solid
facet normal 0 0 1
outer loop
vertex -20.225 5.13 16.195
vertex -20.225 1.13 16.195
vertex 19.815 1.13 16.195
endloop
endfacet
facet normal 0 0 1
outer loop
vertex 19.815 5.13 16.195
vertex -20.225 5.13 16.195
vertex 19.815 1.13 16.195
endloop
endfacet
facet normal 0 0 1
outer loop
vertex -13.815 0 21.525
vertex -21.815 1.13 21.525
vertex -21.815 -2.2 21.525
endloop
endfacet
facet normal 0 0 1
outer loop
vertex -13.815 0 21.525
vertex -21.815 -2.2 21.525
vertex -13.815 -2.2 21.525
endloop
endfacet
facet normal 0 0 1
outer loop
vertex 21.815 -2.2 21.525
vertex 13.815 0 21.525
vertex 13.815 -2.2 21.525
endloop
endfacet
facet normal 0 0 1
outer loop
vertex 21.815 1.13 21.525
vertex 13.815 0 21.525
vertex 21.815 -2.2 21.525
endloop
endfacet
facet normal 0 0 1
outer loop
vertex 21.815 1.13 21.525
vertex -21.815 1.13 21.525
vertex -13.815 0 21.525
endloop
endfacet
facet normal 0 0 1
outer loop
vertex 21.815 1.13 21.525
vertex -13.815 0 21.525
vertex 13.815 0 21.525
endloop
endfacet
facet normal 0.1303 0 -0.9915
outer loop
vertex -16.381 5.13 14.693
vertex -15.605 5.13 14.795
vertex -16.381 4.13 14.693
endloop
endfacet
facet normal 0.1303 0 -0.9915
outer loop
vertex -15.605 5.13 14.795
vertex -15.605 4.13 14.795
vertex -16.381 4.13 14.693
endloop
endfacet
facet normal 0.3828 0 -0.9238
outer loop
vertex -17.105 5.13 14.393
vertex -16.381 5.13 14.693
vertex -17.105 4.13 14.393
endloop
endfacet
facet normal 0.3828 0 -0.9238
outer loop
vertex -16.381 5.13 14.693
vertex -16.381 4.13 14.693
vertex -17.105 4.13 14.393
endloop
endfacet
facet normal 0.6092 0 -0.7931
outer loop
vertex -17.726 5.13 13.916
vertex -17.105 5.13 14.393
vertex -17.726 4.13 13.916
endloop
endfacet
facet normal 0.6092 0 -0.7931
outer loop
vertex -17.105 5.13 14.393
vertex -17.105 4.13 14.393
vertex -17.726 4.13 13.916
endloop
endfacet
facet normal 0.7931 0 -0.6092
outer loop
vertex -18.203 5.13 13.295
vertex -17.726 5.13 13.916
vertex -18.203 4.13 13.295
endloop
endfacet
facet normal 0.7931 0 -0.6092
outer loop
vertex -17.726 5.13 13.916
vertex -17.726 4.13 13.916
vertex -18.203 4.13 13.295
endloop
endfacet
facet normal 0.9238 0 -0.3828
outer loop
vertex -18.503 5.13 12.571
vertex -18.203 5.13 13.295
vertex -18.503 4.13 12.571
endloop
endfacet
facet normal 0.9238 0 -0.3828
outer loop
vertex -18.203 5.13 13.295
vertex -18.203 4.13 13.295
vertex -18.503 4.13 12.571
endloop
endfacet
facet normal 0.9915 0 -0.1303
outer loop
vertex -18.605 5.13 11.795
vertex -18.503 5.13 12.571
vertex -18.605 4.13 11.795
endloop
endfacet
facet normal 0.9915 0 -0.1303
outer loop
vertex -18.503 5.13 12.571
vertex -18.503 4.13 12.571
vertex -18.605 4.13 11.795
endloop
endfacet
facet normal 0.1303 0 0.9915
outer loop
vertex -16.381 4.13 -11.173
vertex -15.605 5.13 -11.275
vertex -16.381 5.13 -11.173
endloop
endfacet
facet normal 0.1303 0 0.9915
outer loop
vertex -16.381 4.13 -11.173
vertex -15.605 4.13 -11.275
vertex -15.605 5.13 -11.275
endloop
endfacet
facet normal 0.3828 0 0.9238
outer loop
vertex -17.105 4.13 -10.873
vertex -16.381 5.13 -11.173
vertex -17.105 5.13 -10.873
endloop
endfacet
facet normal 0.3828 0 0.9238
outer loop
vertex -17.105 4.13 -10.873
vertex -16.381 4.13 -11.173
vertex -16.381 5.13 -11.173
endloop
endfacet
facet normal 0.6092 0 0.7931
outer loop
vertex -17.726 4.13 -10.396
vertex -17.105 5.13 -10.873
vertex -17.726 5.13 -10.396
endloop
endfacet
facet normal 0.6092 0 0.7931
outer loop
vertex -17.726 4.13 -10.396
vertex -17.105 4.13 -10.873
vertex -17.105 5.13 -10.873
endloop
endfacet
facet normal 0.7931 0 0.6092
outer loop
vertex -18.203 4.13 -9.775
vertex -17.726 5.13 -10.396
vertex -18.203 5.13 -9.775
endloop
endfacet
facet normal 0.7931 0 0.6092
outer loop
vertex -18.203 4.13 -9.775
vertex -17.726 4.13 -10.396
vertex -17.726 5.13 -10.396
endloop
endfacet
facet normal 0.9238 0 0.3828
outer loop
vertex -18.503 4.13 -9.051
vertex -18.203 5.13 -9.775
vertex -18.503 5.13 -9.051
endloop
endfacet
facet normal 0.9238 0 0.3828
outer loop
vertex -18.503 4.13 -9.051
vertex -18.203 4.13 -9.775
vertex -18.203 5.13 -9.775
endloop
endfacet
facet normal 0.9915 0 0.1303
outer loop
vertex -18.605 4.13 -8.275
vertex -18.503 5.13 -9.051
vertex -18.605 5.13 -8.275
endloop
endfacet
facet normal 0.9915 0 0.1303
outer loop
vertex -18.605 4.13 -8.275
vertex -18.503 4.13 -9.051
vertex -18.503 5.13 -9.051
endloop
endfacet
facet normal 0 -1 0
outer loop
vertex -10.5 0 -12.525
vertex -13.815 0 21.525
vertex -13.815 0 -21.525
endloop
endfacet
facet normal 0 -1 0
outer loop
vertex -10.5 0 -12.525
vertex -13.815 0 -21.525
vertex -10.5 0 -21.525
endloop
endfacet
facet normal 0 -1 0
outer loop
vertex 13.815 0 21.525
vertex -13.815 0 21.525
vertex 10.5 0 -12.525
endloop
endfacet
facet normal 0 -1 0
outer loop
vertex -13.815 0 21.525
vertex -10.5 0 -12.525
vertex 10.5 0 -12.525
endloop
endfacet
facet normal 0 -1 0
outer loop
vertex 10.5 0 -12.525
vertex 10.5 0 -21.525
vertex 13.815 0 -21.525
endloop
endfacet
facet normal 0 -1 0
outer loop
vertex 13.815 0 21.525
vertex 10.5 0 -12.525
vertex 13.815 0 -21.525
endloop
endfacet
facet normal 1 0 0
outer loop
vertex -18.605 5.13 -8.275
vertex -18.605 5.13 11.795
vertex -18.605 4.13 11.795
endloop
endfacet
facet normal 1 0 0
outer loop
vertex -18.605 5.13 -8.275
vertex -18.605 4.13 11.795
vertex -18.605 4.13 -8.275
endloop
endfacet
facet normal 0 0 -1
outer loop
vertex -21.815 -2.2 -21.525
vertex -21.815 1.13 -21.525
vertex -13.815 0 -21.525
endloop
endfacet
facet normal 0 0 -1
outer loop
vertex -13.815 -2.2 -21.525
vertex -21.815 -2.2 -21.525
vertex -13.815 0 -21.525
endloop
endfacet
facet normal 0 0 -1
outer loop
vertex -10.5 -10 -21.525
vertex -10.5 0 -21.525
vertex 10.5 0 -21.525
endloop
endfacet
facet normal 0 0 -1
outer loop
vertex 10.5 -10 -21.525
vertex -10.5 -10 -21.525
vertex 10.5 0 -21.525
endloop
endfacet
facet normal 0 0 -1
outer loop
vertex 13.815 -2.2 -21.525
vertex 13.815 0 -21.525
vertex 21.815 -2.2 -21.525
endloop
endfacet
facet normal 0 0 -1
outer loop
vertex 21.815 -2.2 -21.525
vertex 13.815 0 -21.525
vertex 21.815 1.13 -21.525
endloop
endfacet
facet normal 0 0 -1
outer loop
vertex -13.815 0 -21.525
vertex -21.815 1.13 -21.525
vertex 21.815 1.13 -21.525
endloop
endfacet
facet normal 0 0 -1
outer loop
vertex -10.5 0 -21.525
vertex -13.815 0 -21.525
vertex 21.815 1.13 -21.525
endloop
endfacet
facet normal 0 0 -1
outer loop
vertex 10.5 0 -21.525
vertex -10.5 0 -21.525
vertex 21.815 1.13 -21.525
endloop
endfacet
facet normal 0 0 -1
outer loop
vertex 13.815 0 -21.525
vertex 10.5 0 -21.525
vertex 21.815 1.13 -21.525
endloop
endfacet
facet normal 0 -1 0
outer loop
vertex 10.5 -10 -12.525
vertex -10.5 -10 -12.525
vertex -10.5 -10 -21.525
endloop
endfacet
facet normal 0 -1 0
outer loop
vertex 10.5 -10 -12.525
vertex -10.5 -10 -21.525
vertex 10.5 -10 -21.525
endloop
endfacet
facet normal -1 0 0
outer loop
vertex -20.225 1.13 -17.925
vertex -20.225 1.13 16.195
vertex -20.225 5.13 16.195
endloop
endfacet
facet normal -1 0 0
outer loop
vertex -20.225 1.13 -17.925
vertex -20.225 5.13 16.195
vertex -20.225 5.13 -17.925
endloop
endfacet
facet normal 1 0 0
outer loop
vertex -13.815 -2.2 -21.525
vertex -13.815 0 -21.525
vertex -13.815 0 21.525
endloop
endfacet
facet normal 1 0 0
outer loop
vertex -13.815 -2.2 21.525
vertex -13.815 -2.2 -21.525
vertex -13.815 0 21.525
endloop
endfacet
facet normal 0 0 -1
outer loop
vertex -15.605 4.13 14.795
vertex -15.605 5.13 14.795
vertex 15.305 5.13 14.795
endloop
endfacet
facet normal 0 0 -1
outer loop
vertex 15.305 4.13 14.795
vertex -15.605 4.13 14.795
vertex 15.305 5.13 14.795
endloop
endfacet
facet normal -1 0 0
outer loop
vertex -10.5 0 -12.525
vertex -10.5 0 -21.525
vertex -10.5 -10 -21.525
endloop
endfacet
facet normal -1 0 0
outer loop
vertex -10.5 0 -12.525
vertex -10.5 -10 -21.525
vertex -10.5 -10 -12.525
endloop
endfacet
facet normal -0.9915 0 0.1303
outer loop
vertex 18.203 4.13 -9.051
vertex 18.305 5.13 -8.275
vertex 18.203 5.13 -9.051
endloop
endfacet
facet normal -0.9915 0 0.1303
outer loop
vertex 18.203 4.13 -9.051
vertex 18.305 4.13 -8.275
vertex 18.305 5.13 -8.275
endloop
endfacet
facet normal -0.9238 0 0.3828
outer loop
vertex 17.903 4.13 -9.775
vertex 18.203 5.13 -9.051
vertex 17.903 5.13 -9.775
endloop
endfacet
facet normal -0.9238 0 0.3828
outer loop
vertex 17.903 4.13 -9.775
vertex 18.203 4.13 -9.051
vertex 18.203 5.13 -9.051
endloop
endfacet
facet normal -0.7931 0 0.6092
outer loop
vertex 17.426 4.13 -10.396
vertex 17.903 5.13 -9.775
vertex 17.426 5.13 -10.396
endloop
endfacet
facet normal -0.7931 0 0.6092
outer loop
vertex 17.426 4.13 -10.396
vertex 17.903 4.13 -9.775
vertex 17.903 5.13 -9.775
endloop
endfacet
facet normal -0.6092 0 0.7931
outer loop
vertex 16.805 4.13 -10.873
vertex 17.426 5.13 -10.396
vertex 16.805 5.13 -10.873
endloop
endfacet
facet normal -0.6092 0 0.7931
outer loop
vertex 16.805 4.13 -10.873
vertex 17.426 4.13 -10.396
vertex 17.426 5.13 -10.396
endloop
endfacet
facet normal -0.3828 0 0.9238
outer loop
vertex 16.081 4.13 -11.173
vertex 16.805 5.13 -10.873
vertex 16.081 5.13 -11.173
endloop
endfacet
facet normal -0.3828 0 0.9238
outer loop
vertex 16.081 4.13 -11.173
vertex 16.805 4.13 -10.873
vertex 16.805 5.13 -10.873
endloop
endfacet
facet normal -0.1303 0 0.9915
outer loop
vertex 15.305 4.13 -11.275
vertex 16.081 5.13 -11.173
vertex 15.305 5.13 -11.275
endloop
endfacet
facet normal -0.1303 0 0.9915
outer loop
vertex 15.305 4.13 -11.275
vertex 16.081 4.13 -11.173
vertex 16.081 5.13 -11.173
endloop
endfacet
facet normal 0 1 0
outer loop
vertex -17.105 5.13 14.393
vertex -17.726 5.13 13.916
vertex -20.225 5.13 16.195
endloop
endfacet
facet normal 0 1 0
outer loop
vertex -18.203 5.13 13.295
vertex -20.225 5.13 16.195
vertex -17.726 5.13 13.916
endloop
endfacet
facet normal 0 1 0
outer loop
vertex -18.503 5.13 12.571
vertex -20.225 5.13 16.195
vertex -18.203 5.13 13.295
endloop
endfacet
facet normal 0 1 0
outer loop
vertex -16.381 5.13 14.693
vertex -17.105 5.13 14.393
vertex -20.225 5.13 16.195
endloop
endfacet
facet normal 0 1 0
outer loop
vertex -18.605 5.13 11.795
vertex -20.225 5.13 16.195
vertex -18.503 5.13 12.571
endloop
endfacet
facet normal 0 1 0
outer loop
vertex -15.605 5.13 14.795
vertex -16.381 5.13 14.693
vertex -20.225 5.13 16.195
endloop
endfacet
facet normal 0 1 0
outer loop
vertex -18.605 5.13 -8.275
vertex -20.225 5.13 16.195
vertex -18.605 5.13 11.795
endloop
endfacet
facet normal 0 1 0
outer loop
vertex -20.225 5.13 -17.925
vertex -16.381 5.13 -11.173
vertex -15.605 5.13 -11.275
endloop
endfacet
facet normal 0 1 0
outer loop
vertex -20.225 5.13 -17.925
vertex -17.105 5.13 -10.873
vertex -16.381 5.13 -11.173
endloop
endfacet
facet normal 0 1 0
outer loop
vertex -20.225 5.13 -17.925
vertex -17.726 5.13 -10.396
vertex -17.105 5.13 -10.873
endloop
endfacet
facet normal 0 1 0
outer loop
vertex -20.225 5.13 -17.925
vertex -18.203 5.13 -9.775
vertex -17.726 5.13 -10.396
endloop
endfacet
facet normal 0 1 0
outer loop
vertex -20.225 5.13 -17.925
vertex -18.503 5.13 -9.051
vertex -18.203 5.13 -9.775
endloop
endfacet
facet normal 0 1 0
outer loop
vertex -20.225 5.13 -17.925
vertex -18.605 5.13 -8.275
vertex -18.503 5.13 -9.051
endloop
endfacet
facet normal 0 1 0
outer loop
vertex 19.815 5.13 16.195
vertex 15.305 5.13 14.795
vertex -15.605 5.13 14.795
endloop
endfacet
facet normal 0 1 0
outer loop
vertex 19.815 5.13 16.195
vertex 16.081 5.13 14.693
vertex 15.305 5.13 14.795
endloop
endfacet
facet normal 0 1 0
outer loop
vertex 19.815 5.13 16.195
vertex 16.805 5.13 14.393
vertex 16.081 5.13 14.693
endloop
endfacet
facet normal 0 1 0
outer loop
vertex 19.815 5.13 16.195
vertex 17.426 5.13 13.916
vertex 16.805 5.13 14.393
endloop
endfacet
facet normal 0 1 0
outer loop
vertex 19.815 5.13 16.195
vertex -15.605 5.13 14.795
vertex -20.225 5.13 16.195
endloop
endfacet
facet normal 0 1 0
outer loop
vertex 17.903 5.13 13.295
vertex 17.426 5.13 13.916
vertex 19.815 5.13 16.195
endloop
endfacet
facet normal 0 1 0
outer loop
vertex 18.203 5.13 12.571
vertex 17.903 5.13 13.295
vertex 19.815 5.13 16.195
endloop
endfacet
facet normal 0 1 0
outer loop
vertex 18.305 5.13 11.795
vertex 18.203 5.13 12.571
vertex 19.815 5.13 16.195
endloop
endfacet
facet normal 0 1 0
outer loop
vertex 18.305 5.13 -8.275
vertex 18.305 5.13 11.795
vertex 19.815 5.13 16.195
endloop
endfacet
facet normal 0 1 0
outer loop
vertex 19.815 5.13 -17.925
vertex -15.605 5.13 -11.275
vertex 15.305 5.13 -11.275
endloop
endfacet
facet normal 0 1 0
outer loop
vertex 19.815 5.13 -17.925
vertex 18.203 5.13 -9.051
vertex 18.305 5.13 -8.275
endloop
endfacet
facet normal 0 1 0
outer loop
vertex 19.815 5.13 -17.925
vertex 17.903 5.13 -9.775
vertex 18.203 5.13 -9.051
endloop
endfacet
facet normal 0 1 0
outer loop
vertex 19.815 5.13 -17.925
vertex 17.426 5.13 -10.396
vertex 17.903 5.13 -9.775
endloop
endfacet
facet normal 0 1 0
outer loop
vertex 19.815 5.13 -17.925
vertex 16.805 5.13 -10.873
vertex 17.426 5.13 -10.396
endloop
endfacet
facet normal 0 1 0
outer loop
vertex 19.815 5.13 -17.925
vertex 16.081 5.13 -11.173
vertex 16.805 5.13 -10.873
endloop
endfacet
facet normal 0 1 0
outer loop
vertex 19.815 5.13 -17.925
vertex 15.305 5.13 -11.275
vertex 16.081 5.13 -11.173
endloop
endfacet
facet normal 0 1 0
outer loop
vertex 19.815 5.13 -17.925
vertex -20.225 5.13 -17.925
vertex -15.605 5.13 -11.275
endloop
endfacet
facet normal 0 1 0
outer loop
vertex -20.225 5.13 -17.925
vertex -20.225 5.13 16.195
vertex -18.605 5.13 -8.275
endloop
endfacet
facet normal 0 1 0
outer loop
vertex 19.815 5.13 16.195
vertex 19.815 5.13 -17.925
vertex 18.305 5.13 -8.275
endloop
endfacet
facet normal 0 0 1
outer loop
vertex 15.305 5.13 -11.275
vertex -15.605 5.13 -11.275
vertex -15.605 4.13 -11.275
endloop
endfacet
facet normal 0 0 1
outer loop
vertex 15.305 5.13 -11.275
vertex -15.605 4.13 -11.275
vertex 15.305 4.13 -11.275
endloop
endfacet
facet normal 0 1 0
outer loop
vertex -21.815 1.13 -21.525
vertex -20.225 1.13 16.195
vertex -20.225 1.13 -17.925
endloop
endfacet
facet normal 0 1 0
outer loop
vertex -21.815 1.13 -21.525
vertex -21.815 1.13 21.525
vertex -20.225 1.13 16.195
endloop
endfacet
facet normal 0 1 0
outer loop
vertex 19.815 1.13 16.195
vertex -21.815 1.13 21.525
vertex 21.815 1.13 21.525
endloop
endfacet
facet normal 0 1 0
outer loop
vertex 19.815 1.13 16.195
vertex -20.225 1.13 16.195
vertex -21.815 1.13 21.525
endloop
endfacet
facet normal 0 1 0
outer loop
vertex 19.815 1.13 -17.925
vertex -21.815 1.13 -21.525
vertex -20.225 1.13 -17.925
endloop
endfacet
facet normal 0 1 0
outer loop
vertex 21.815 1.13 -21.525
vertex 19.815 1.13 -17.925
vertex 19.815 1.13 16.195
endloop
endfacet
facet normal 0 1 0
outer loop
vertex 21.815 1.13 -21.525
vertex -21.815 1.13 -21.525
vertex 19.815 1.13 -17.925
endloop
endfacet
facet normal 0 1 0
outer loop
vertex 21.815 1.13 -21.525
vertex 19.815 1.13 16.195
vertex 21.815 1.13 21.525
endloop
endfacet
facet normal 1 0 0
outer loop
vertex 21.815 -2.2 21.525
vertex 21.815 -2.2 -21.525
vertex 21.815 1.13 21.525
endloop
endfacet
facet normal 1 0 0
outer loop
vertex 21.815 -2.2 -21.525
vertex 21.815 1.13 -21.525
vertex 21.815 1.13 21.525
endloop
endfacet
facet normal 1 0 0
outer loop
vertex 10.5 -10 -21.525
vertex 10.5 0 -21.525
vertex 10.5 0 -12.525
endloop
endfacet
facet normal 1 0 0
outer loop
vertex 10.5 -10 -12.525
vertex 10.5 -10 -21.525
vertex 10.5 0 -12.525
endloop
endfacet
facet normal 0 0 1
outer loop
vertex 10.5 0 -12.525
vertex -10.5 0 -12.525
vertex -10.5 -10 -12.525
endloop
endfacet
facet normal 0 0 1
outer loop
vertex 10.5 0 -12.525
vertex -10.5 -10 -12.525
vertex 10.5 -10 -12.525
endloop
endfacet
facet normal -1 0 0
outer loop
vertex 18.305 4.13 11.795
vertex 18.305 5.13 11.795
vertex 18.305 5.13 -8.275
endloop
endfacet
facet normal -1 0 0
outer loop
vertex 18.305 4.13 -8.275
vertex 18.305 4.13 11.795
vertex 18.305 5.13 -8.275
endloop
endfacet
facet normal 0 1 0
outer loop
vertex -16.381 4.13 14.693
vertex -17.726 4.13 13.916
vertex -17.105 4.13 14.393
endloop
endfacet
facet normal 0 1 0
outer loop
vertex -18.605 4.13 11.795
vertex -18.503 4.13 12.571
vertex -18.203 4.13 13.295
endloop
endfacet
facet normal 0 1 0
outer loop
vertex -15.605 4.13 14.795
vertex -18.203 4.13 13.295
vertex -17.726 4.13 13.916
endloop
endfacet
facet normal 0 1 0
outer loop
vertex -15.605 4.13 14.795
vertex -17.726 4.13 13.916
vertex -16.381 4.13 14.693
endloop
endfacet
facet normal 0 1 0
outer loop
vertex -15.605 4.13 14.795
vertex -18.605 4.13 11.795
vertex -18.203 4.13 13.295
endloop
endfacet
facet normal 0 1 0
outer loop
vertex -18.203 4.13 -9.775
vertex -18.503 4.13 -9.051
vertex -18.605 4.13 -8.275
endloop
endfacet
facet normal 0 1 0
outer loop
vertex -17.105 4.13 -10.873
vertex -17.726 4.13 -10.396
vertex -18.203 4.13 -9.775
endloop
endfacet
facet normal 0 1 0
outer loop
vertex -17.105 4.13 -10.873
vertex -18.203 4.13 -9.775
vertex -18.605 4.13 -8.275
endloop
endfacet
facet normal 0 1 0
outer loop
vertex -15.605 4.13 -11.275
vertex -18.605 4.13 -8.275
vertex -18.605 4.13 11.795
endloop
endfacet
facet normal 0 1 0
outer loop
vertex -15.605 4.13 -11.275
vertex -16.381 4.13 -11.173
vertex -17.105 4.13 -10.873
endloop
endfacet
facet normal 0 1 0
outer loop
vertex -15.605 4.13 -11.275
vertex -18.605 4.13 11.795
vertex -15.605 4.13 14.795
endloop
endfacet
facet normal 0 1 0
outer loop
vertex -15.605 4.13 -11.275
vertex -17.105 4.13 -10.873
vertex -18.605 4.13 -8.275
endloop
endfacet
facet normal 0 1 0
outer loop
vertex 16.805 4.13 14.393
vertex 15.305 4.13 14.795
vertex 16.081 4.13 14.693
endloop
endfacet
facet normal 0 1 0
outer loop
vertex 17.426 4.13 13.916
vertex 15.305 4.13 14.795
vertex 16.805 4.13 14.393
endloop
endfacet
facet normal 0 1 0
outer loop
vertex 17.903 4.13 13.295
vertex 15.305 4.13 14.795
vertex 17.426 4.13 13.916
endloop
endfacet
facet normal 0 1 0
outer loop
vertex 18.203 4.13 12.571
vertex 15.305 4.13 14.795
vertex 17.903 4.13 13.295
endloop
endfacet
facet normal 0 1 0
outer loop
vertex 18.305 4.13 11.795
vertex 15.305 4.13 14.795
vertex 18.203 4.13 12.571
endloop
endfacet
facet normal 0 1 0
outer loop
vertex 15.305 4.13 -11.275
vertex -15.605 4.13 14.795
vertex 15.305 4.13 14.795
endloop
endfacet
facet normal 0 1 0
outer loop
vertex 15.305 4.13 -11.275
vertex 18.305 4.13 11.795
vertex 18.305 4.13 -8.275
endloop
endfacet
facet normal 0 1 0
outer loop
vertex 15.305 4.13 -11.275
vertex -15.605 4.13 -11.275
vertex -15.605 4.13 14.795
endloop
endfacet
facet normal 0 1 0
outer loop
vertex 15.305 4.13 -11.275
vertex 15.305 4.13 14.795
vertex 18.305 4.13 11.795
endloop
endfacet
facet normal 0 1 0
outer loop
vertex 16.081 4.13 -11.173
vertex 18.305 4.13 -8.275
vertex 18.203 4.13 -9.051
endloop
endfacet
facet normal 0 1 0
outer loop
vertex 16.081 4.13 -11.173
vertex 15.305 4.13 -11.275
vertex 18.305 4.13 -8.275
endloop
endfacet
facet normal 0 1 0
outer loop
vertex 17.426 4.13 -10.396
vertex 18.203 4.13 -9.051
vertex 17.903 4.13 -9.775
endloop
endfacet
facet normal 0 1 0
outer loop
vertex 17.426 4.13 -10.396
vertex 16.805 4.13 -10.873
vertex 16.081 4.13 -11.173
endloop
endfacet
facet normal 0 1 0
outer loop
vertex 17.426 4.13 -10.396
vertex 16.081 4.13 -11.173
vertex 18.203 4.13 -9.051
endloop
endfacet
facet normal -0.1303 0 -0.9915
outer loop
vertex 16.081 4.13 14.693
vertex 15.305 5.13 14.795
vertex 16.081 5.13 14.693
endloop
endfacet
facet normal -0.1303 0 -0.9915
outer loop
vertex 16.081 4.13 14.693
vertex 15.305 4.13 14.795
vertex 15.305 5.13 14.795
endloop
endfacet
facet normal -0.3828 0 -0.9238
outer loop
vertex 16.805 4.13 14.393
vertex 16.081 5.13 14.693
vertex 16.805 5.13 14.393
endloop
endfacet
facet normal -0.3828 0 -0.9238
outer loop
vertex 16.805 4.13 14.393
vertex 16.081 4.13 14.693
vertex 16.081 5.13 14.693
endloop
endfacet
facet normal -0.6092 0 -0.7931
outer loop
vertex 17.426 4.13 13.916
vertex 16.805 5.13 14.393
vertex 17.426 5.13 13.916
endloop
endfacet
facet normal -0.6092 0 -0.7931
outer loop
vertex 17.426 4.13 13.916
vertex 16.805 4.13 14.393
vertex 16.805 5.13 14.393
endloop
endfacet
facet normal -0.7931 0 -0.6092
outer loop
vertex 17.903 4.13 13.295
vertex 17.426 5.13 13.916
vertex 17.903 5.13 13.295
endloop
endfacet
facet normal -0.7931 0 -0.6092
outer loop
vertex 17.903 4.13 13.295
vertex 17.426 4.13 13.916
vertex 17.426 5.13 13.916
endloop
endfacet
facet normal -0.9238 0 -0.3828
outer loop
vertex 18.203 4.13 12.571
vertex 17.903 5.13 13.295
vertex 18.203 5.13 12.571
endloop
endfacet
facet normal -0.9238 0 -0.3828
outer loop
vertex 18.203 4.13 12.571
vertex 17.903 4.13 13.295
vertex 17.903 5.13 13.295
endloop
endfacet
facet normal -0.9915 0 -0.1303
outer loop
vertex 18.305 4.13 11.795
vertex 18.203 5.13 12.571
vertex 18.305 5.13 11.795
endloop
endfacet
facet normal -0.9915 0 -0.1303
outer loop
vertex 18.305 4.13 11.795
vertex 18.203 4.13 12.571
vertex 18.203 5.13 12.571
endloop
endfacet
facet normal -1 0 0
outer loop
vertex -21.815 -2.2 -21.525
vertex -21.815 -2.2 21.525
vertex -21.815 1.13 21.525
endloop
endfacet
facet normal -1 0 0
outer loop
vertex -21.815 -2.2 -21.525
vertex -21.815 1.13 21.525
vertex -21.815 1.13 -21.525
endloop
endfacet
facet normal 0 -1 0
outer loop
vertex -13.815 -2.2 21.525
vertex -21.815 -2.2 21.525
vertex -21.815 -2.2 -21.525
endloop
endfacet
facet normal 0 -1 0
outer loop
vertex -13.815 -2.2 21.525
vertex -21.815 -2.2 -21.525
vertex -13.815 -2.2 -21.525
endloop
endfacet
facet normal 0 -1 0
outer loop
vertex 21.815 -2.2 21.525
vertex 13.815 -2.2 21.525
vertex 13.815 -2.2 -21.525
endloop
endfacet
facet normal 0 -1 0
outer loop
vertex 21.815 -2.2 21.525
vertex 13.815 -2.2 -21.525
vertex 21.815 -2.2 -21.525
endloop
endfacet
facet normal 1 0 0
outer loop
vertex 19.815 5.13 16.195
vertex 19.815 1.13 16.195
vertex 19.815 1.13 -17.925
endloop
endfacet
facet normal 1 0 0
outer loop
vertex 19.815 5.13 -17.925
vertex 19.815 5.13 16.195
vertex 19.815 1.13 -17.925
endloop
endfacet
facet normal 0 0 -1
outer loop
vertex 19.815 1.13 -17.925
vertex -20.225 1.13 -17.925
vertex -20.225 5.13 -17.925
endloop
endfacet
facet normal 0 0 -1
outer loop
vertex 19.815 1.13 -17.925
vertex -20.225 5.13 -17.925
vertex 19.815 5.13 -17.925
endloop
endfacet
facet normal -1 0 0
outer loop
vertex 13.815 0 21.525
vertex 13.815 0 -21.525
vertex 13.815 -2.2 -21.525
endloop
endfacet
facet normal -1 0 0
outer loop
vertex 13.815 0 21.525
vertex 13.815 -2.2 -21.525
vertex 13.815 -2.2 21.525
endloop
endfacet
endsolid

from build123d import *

# Parameters (mm, degrees)
SKETCH1_W           = 43.63
SKETCH1_H           = 43.05
BOSS_EXTRUDE1_DEPTH = 1.13
SKETCH2_W           = 40.04
SKETCH2_H           = 34.12
BOSS_EXTRUDE2_DEPTH = 4
SKETCH4_W           = 36.91
SKETCH4_H           = 26.07
CUT_EXTRUDE1_DEPTH  = 1
FILLET1_R           = 3
SKETCH5_W           = 21
SKETCH5_H           = 9
BOSS_EXTRUDE3_DEPTH = 10
SKETCH6_W           = 8
SKETCH6_H           = 43.05
BOSS_EXTRUDE4_DEPTH = 2.2


with BuildPart() as part:
    # Sketch1 → Boss-Extrude1 (new body)
    with BuildSketch(Plane(origin=(0, 0, 0), x_dir=(1, 0, 0), z_dir=(0, 1, 0))):
        Rectangle(SKETCH1_W, SKETCH1_H)
    extrude(amount=BOSS_EXTRUDE1_DEPTH)

    # Sketch2 → Boss-Extrude2 (add)
    with BuildSketch(Plane(origin=(0, 1.13, 0), x_dir=(1, 0, 0), z_dir=(0, 1, 0))):
        with Locations((-0.205, 0.865)):
            Rectangle(SKETCH2_W, SKETCH2_H)
    extrude(amount=BOSS_EXTRUDE2_DEPTH)

    # Sketch4 → Cut-Extrude1 (cut)
    with BuildSketch(Plane(origin=(0, 5.13, 0), x_dir=(1, 0, 0), z_dir=(0, 1, 0))):
        with Locations((-0.15, -1.76)):
            Rectangle(SKETCH4_W, SKETCH4_H)
    extrude(amount=-CUT_EXTRUDE1_DEPTH, mode=Mode.SUBTRACT)

    # Fillet1
    fillet1_edges = [part.edges().sort_by_distance(p)[0] for p in [
        (-18.605, 4.63, 14.795),
        (-18.605, 4.63, -11.275),
        (18.305, 4.63, -11.275),
        (18.305, 4.63, 14.795),
    ]]
    fillet(fillet1_edges, radius=FILLET1_R)

    # Sketch5 → Boss-Extrude3 (add)
    with BuildSketch(Plane.XZ):
        with Locations((0, -17.025)):
            Rectangle(SKETCH5_W, SKETCH5_H)
    extrude(amount=BOSS_EXTRUDE3_DEPTH)

    # Sketch6 → Boss-Extrude4 (add)
    with BuildSketch(Plane.XZ):
        with Locations((17.815, 0)):
            Rectangle(SKETCH6_W, SKETCH6_H)
        with Locations((-17.815, 0)):
            Rectangle(SKETCH6_W, SKETCH6_H)
    extrude(amount=BOSS_EXTRUDE4_DEPTH)


solid = part.part
